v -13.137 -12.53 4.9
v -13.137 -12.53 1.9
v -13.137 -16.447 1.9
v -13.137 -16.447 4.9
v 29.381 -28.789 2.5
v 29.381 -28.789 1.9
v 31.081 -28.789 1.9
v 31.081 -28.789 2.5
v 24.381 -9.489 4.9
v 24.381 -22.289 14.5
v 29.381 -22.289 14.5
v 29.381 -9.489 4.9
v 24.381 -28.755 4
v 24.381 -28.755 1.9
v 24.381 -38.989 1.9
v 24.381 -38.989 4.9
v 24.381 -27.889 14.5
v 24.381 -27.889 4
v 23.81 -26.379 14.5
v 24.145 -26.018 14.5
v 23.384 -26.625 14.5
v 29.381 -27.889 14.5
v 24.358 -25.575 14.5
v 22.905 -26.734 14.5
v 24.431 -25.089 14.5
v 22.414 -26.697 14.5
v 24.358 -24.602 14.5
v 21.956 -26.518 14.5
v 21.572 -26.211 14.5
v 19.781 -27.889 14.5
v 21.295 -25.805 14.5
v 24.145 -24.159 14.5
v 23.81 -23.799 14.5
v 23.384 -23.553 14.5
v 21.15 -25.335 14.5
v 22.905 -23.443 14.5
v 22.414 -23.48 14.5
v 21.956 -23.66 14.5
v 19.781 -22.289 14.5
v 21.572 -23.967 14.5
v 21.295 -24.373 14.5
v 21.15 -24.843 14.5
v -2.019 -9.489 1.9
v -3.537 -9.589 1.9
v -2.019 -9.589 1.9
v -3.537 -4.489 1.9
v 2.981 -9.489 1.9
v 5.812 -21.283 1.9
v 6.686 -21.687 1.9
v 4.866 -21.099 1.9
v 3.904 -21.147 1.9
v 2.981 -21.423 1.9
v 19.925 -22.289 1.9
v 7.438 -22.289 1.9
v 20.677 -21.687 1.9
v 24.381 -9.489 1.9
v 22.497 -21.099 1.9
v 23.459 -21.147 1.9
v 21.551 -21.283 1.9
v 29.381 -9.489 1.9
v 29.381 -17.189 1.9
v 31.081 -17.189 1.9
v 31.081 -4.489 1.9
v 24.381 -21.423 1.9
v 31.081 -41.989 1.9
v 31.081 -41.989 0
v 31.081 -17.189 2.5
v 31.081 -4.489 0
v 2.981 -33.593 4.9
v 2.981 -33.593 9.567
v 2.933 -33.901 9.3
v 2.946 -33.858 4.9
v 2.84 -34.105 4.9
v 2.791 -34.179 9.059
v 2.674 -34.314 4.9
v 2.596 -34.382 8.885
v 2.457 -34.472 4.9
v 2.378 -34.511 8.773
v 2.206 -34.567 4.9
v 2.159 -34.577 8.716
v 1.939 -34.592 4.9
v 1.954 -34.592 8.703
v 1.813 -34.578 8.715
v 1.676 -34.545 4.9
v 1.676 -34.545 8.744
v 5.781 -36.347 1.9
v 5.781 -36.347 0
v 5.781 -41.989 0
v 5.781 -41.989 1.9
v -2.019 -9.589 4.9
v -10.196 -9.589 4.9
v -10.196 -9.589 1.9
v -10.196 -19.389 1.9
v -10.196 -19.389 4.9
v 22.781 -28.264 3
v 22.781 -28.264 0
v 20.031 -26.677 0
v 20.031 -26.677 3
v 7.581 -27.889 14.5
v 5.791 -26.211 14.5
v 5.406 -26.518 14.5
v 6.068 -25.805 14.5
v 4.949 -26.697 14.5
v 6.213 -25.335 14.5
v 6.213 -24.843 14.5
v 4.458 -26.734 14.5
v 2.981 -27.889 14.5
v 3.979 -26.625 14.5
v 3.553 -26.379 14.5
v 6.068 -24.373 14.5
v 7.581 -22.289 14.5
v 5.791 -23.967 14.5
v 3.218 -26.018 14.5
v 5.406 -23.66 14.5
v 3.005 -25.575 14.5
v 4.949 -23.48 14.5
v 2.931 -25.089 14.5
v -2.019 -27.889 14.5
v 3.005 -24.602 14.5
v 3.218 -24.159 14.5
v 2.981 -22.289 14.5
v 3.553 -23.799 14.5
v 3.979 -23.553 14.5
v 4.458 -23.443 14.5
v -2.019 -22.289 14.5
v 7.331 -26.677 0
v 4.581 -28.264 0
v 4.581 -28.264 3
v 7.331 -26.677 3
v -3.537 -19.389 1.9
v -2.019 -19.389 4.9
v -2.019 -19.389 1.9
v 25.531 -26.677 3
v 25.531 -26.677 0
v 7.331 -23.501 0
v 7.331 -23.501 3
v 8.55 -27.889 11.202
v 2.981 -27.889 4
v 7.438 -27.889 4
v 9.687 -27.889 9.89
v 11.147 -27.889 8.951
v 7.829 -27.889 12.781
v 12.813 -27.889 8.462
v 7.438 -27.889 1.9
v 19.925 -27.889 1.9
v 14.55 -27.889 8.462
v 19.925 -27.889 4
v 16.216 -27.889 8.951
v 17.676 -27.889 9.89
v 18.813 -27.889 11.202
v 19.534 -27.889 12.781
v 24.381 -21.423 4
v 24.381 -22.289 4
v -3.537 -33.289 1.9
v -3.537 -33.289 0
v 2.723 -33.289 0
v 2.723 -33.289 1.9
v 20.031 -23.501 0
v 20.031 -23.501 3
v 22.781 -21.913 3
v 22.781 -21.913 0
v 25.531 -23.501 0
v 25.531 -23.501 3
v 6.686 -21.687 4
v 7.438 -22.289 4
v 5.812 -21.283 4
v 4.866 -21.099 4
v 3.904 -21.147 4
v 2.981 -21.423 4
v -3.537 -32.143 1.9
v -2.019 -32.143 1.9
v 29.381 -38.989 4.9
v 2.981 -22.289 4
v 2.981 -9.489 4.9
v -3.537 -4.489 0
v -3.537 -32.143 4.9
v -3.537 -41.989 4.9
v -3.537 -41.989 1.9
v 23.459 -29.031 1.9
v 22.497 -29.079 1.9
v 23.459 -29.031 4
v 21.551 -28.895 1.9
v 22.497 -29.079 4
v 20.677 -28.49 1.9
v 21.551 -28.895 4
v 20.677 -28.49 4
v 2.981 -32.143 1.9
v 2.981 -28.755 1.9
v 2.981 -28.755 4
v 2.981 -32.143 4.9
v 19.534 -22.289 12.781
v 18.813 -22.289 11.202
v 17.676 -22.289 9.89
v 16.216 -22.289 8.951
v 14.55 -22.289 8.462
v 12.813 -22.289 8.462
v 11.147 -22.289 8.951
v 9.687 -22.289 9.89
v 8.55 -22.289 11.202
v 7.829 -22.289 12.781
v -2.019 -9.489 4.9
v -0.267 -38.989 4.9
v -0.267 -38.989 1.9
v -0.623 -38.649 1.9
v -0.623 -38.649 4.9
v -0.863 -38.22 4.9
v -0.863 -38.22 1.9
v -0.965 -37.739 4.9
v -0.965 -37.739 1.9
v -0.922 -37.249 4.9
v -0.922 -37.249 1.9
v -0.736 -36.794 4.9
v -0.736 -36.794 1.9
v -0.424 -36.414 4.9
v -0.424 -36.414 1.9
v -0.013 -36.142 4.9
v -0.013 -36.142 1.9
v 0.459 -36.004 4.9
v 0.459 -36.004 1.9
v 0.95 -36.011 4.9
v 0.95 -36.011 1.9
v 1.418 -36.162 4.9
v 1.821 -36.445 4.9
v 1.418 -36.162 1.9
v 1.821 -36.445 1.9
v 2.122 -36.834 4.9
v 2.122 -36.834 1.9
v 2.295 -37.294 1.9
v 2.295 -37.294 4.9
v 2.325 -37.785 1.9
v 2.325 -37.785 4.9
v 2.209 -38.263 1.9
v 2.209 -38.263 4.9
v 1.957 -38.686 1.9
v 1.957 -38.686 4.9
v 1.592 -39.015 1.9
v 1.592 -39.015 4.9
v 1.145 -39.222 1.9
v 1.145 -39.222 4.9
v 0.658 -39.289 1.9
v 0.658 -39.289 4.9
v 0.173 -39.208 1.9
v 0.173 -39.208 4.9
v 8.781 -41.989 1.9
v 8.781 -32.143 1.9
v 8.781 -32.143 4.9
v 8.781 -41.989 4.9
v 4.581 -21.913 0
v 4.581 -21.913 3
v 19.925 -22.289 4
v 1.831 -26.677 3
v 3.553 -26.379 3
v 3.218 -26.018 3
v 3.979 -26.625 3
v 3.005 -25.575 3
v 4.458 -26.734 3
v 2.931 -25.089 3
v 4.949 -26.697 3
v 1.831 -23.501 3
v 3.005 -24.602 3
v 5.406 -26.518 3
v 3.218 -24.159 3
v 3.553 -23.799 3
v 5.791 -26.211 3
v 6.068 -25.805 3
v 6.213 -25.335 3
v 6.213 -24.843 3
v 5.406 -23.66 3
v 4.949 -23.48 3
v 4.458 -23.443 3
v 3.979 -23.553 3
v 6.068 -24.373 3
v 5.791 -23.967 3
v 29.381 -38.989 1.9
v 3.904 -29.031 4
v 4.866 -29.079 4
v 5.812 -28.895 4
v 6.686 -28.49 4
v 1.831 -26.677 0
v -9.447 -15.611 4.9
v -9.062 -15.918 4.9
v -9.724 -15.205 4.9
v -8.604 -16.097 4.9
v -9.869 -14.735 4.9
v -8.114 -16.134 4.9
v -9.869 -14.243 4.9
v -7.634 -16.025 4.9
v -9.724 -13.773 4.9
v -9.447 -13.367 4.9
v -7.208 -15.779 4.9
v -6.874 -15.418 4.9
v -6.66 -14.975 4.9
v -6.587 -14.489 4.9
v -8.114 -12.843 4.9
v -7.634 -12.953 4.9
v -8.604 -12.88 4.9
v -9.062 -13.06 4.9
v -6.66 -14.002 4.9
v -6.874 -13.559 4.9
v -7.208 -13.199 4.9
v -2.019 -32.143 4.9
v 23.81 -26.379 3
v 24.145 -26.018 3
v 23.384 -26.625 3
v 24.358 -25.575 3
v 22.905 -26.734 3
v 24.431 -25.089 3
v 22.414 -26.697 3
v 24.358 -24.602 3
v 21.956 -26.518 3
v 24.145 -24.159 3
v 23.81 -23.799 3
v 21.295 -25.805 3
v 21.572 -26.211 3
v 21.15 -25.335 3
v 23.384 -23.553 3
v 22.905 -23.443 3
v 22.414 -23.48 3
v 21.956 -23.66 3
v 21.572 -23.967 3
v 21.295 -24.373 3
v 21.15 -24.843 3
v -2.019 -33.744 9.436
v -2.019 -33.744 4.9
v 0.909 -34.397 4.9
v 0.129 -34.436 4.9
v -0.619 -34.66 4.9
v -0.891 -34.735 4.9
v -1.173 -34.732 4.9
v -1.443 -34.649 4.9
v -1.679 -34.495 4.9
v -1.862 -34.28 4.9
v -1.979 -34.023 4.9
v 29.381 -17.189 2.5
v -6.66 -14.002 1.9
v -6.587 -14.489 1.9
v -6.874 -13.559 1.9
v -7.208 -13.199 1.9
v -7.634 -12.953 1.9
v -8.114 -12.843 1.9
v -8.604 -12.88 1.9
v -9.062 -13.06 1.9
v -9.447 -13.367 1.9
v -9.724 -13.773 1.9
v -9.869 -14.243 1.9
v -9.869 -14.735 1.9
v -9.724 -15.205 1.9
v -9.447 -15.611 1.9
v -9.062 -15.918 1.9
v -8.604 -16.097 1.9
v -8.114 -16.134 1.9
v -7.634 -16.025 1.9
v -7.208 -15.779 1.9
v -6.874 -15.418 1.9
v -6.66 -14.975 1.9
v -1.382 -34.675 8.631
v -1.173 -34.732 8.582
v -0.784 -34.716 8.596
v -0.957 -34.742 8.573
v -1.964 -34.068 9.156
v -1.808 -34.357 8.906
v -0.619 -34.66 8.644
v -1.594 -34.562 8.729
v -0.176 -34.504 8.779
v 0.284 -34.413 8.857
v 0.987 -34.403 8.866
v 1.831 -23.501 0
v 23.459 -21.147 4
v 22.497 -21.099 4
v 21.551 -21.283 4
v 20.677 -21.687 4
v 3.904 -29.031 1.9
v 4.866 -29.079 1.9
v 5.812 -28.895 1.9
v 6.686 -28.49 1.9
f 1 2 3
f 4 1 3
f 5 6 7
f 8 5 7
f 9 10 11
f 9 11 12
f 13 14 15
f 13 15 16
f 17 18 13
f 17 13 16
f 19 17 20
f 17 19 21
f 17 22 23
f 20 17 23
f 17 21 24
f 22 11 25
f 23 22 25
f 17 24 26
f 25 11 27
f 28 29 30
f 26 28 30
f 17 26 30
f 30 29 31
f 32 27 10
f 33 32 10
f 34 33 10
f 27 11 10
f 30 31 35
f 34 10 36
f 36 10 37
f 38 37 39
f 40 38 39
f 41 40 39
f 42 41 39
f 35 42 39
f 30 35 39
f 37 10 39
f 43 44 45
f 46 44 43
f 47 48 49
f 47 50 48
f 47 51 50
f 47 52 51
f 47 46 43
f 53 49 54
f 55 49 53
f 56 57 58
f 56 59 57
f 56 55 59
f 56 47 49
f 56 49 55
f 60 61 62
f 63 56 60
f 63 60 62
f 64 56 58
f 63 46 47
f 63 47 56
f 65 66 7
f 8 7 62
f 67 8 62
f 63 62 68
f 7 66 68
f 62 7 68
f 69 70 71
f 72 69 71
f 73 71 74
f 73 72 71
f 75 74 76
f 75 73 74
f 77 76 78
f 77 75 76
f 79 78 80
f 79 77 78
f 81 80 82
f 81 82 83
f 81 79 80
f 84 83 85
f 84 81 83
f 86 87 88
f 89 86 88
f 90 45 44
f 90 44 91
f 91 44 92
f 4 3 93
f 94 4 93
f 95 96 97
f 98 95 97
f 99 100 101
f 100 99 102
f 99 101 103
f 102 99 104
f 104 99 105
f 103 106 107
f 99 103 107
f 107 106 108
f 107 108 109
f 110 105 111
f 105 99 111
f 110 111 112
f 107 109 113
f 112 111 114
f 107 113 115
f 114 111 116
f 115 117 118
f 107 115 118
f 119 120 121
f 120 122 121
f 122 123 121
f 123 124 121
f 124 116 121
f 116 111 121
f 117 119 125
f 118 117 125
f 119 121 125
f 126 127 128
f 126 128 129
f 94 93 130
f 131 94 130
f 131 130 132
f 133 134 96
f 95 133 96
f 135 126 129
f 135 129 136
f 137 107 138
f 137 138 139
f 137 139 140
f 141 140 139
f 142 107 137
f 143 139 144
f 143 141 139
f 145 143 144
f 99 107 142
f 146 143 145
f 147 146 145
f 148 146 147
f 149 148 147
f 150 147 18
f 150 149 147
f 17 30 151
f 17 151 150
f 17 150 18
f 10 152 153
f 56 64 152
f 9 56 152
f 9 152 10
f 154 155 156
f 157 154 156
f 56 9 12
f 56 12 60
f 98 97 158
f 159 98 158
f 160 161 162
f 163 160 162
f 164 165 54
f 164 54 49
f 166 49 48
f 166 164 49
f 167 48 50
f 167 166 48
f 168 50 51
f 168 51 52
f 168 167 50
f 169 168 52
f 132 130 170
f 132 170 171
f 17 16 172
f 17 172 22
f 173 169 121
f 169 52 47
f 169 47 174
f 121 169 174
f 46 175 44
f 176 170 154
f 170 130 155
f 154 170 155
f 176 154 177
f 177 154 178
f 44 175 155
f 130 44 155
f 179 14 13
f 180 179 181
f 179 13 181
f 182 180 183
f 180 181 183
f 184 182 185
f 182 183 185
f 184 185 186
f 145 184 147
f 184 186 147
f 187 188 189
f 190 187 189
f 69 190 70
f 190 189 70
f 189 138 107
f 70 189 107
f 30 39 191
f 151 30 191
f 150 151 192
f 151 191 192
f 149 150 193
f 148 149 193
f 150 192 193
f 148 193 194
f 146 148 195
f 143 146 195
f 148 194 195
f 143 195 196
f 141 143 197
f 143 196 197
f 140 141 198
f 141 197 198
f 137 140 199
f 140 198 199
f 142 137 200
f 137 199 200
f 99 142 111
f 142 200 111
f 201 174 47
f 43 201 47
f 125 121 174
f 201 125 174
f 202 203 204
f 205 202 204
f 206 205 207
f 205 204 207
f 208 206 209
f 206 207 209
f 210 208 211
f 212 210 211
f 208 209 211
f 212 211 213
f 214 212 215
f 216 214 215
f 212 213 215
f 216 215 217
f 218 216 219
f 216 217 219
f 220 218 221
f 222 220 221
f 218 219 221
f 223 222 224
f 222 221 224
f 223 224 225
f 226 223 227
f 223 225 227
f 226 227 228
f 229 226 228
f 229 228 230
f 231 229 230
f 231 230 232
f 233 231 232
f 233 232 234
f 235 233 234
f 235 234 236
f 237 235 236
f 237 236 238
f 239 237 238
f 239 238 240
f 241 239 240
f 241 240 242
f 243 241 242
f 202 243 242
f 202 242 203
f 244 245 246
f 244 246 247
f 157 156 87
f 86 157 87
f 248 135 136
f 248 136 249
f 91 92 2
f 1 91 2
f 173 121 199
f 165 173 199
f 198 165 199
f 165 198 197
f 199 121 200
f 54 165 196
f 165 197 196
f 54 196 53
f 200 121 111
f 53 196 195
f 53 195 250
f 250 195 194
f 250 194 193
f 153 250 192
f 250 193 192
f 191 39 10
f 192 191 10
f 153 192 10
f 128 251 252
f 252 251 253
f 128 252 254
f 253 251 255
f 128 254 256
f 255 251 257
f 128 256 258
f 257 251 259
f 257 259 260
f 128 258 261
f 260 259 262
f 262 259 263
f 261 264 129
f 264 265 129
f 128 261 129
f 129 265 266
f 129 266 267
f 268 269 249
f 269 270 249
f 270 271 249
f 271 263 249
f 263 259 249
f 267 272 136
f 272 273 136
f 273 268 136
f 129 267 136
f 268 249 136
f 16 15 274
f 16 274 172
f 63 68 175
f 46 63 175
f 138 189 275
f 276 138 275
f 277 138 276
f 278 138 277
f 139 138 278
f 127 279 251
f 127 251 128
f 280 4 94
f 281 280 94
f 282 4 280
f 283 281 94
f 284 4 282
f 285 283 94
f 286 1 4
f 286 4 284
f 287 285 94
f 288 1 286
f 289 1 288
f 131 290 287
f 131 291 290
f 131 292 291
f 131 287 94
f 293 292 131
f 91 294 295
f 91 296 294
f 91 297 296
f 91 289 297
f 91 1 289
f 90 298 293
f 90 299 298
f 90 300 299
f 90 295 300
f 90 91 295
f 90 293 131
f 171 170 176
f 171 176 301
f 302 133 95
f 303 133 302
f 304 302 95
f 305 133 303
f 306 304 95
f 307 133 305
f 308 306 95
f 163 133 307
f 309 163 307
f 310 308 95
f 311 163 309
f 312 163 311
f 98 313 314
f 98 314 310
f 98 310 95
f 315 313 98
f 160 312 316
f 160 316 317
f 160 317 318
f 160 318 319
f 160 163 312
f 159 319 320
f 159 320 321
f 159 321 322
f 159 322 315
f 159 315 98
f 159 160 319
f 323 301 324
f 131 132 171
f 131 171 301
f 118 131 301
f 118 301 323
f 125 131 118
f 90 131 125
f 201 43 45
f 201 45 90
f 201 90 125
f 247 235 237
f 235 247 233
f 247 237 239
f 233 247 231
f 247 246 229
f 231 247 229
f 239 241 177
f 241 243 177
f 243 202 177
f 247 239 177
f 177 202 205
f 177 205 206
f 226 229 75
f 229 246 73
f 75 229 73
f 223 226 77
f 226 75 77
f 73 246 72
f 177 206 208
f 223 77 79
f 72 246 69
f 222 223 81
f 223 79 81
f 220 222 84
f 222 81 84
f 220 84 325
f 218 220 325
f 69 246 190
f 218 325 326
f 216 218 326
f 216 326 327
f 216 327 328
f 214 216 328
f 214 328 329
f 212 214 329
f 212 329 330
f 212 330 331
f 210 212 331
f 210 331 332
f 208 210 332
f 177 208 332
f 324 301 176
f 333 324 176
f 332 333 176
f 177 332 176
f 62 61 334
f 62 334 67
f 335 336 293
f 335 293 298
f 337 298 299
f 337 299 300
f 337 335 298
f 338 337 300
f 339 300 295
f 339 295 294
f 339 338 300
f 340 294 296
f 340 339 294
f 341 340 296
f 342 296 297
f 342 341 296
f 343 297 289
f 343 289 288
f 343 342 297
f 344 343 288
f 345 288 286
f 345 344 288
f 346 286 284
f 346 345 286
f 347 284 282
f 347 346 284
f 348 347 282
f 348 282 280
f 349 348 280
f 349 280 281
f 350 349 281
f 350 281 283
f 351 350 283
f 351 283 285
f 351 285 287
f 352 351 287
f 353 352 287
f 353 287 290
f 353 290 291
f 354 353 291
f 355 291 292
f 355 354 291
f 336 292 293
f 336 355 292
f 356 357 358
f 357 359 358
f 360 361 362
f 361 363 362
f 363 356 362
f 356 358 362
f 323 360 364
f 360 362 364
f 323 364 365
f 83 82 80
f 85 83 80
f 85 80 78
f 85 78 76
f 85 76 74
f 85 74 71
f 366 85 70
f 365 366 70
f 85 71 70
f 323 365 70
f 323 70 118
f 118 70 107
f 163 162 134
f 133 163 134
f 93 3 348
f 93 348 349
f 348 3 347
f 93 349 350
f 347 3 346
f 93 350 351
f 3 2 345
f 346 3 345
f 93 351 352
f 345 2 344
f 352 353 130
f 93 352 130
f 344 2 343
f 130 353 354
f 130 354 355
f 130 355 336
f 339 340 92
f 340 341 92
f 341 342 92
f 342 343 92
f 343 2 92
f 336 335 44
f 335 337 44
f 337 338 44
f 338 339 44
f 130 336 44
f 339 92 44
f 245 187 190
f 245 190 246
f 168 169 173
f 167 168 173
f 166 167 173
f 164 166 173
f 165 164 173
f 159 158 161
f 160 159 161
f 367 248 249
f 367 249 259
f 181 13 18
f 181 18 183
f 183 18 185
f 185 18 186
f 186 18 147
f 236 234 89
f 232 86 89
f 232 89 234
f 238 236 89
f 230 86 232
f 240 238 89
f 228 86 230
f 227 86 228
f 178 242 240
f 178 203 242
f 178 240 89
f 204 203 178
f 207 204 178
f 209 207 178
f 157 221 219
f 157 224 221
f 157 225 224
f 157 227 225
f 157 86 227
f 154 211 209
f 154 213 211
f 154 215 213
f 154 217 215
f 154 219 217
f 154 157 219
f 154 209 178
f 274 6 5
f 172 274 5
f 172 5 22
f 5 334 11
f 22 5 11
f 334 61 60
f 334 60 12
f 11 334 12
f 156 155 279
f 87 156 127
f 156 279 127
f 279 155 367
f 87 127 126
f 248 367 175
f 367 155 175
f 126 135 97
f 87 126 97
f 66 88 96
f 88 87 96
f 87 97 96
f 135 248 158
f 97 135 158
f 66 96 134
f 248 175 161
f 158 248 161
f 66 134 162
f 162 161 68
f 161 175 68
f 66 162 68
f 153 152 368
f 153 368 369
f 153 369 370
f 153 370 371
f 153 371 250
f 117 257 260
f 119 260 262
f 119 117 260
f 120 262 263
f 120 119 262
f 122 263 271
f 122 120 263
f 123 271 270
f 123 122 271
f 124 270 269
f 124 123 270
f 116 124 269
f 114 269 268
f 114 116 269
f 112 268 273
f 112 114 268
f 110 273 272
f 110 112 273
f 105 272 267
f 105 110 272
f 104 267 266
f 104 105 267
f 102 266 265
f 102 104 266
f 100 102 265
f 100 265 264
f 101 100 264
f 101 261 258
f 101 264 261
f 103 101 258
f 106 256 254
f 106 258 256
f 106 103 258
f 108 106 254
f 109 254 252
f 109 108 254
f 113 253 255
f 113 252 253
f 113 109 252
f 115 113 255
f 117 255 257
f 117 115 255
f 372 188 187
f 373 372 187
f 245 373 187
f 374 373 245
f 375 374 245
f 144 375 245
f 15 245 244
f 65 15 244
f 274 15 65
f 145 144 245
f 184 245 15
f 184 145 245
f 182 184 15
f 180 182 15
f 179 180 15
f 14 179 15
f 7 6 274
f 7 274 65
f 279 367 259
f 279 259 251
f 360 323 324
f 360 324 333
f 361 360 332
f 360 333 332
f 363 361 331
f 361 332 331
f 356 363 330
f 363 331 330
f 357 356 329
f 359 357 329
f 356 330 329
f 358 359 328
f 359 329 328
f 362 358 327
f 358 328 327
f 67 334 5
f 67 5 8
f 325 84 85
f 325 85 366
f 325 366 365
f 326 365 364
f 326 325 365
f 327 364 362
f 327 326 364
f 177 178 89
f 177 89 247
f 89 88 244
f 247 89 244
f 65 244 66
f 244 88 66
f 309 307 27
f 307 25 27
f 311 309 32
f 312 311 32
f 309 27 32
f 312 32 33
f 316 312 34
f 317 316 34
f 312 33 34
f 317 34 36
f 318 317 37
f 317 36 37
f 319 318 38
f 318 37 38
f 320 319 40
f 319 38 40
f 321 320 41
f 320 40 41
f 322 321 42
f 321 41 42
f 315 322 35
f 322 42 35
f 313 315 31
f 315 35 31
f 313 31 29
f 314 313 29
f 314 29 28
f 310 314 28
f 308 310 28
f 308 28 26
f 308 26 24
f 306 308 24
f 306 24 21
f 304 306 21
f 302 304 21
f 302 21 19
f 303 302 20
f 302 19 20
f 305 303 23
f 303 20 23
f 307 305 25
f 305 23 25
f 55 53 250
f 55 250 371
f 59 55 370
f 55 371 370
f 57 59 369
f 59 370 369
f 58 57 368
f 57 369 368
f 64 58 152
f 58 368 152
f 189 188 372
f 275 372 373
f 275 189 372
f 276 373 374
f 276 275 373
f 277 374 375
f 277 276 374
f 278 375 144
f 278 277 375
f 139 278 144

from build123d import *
from build123d.topology import SkipClean

# Parameters (mm, degrees)
BOSS_EXTRUDE1_START = 0.2
BOSS_EXTRUDE1_DEPTH = 5.6
BOSS_EXTRUDE2_DEPTH = 1.9
SKETCH5_R           = 1.65
BOSS_EXTRUDE3_DEPTH = 3
SKETCH6_W           = 5.7
SKETCH6_H           = 11.6
BOSS_EXTRUDE4_DEPTH = 0.6
BOSS_EXTRUDE5_START = -2
BOSS_EXTRUDE5_DEPTH = 5
SKETCH3_R           = 1.65
CUT_EXTRUDE1_DEPTH  = 50
BOSS_EXTRUDE6_START = -4
SKETCH10_R          = 4
SKETCH10_R_2        = 1.65
BOSS_EXTRUDE6_DEPTH = 4
CUT_EXTRUDE3_DEPTH  = 3
SKETCH13_R          = 1.65
CUT_EXTRUDE4_DEPTH  = 10
SKETCH14_R          = 3.25
CUT_EXTRUDE5_DEPTH  = 10
FILLET1_R           = 1


with BuildPart() as part:
    # Sketch2 → Boss-Extrude1 (new body)
    with BuildSketch(Plane.XZ.offset(22.088801204).offset(BOSS_EXTRUDE1_START)):
        with BuildLine():
            ThreePointArc((19.781498191, 14.5), (13.681498191, 8.4), (7.581498191, 14.5))
            Line((7.581498191, 14.5), (2.581498191, 14.5))
            Line((2.581498191, 14.5), (0.981498191, 14.5))
            Line((0.981498191, 14.5), (0.981498191, 0))
            Line((0.981498191, 0), (26.381498191, 0))
            Line((26.381498191, 0), (26.381498191, 14.5))
            Line((26.381498191, 14.5), (24.781498191, 14.5))
            Line((24.781498191, 14.5), (19.781498191, 14.5))
        make_face()
    extrude(amount=BOSS_EXTRUDE1_DEPTH)

    # Sketch4 → Boss-Extrude2 (add)
    with BuildSketch(Plane.XY):
        Polygon((5.781498191, -39.638801204), (5.781498191, -41.988801204), (31.081498191, -41.988801204), (31.081498191, -4.488801204), (-3.537114605, -4.488801204), (-3.537114605, -33.288801204), (2.722919547, -33.288801204), (5.781498191, -36.347379848), align=None)
    extrude(amount=BOSS_EXTRUDE2_DEPTH)

    # Sketch5 → Boss-Extrude3 (add)
    # profile 1 of 2: a face of its own
    with BuildSketch(Plane.XY.offset(1.9)):
        Polygon((-3.737114605, -9.588801204), (-10.195693249, -9.588801204), (-13.137114605, -12.53022256), (-13.137114605, -16.447379848), (-10.195693249, -19.388801204), (-3.737114605, -19.388801204), (-0.537114605, -19.388801204), (-0.537114605, -9.588801204), align=None)
        with Locations((-8.237114605, -14.488801204)):
            Circle(SKETCH5_R, mode=Mode.SUBTRACT)
    # profile 2 of 2: a face of its own
    with BuildSketch(Plane.XY.offset(1.9)):
        Polygon((5.781498191, -41.988801204), (-3.537114605, -41.988801204), (-3.537114605, -33.488801204), (-3.537114605, -32.143344659), (8.781498191, -32.143344659), (8.781498191, -41.988801204), align=None)
        with Locations((0.681498191, -37.638801204)):
            Circle(SKETCH5_R, mode=Mode.SUBTRACT)
    extrude(amount=BOSS_EXTRUDE3_DEPTH)

    # Sketch6 → Boss-Extrude4 (add)
    with BuildSketch(Plane.XY.offset(1.9)):
        with Locations((28.231498191, -22.988801204)):
            Rectangle(SKETCH6_W, SKETCH6_H)
    extrude(amount=BOSS_EXTRUDE4_DEPTH)

    # Sketch9 → Boss-Extrude5 (add)
    with BuildSketch(Plane(origin=(26.381498191, 0, 0), x_dir=(0, 0, -1), z_dir=(1, 0, 0)).offset(BOSS_EXTRUDE5_START)):
        Polygon((-1.9, -38.988801204), (-4.9, -38.988801204), (-14.5, -27.888801204), (-14.5, -22.288801204), (-4.9, -9.488801204), (-1.9, -9.488801204), align=None)
    boss_extrude5 = extrude(amount=BOSS_EXTRUDE5_DEPTH)

    # Sketch3 → Cut-Extrude1 (cut)
    with BuildSketch(Plane.XY.offset(14.5)):
        with Locations((22.781498191, -25.088801204)):
            Circle(SKETCH3_R)
    cut_extrude1 = extrude(amount=-CUT_EXTRUDE1_DEPTH, mode=Mode.SUBTRACT)

    # Sketch10 → Boss-Extrude6 (add)
    with BuildSketch(Plane(origin=(0, 0, 0), x_dir=(-1, 0, 0), z_dir=(0, 0, -1)).offset(BOSS_EXTRUDE6_START)):
        with Locations((-22.781498191, -25.088801204)):
            Circle(SKETCH10_R)
        with Locations(Location((-22.781498191, -25.088801204, 0), (0, 0, 180))):
            Circle(SKETCH10_R_2, mode=Mode.SUBTRACT)
    boss_extrude6 = extrude(amount=BOSS_EXTRUDE6_DEPTH)

    # Sketch11 → Cut-Extrude3 (cut)
    with BuildSketch(Plane(origin=(0, 0, 0), x_dir=(-1, 0, 0), z_dir=(0, 0, -1))):
        Polygon((-22.781498191, -21.913374723), (-25.531498191, -23.501087964), (-25.531498191, -26.676514444), (-22.781498191, -28.264227685), (-20.031498191, -26.676514444), (-20.031498191, -23.501087964), align=None)
    cut_extrude3 = extrude(amount=-CUT_EXTRUDE3_DEPTH, mode=Mode.SUBTRACT)

    # Mirror1: Boss-Extrude5, Cut-Extrude1, Boss-Extrude6, Cut-Extrude3 across plane
    add(boss_extrude5.mirror(Plane(origin=(13.681498191, 0, 0), x_dir=(0, 0, 1), z_dir=(1, 0, 0))))
    add(cut_extrude1.mirror(Plane(origin=(13.681498191, 0, 0), x_dir=(0, 0, 1), z_dir=(1, 0, 0))), mode=Mode.SUBTRACT)
    add(boss_extrude6.mirror(Plane(origin=(13.681498191, 0, 0), x_dir=(0, 0, 1), z_dir=(1, 0, 0))))
    add(cut_extrude3.mirror(Plane(origin=(13.681498191, 0, 0), x_dir=(0, 0, 1), z_dir=(1, 0, 0))), mode=Mode.SUBTRACT)

    # Sketch13 → Cut-Extrude4 (cut)
    with SkipClean():  # the faces are left unmerged after this step: merging them gives an invalid solid
        with BuildSketch(Plane(origin=(0, 0, 1.9), x_dir=(-1, 0, 0), z_dir=(0, 0, -1))):
            with Locations(Location((-0.681498191, -37.638801204, 0), (0, 0, 305.096801228))):
                Circle(SKETCH13_R)
        extrude(amount=-CUT_EXTRUDE4_DEPTH, mode=Mode.SUBTRACT)

    # Sketch14 → Cut-Extrude5 (cut)
    with SkipClean():  # the faces are left unmerged after this step: merging them gives an invalid solid
        with BuildSketch(Plane.XY.offset(4.9)):
            with Locations((0.681498191, -37.638801204)):
                Circle(SKETCH14_R)
        extrude(amount=CUT_EXTRUDE5_DEPTH, mode=Mode.SUBTRACT)

    # Fillet1
    fillet1_edges = [part.edges().sort_by_distance(p)[0] for p in [
        (2.981498191, -35.342608703, 6.476731892),
        (-2.018501809, -35.829795952, 6.266056325),
    ]]
    fillet(fillet1_edges, radius=FILLET1_R)


solid = part.part
